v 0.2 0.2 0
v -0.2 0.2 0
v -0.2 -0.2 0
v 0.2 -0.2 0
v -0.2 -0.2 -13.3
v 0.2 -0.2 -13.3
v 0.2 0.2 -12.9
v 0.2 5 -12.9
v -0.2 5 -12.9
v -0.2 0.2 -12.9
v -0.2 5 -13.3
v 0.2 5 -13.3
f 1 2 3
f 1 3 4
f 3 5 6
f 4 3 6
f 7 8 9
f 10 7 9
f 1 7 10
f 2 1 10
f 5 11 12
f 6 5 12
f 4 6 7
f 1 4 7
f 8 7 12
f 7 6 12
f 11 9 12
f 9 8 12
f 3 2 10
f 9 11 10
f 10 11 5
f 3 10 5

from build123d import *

# Parameters (mm, degrees)
SKETCH_4_W = 0.4
SKETCH_4_H = 0.4


with BuildPart() as part:
    # По траектории1: sweep along a curve in space
    with BuildLine() as sweep_1_path:
        Line((0, 0, 0), (0, 0, -13.1))
        Line((0, 0, -13.1), (0, 5, -13.1))
    # Эскиз4 → По траектории1 (sweep)
    with BuildSketch(Plane.XY):
        Rectangle(SKETCH_4_W, SKETCH_4_H)
    sweep(path=sweep_1_path.line, transition=Transition.RIGHT)


solid = part.part
